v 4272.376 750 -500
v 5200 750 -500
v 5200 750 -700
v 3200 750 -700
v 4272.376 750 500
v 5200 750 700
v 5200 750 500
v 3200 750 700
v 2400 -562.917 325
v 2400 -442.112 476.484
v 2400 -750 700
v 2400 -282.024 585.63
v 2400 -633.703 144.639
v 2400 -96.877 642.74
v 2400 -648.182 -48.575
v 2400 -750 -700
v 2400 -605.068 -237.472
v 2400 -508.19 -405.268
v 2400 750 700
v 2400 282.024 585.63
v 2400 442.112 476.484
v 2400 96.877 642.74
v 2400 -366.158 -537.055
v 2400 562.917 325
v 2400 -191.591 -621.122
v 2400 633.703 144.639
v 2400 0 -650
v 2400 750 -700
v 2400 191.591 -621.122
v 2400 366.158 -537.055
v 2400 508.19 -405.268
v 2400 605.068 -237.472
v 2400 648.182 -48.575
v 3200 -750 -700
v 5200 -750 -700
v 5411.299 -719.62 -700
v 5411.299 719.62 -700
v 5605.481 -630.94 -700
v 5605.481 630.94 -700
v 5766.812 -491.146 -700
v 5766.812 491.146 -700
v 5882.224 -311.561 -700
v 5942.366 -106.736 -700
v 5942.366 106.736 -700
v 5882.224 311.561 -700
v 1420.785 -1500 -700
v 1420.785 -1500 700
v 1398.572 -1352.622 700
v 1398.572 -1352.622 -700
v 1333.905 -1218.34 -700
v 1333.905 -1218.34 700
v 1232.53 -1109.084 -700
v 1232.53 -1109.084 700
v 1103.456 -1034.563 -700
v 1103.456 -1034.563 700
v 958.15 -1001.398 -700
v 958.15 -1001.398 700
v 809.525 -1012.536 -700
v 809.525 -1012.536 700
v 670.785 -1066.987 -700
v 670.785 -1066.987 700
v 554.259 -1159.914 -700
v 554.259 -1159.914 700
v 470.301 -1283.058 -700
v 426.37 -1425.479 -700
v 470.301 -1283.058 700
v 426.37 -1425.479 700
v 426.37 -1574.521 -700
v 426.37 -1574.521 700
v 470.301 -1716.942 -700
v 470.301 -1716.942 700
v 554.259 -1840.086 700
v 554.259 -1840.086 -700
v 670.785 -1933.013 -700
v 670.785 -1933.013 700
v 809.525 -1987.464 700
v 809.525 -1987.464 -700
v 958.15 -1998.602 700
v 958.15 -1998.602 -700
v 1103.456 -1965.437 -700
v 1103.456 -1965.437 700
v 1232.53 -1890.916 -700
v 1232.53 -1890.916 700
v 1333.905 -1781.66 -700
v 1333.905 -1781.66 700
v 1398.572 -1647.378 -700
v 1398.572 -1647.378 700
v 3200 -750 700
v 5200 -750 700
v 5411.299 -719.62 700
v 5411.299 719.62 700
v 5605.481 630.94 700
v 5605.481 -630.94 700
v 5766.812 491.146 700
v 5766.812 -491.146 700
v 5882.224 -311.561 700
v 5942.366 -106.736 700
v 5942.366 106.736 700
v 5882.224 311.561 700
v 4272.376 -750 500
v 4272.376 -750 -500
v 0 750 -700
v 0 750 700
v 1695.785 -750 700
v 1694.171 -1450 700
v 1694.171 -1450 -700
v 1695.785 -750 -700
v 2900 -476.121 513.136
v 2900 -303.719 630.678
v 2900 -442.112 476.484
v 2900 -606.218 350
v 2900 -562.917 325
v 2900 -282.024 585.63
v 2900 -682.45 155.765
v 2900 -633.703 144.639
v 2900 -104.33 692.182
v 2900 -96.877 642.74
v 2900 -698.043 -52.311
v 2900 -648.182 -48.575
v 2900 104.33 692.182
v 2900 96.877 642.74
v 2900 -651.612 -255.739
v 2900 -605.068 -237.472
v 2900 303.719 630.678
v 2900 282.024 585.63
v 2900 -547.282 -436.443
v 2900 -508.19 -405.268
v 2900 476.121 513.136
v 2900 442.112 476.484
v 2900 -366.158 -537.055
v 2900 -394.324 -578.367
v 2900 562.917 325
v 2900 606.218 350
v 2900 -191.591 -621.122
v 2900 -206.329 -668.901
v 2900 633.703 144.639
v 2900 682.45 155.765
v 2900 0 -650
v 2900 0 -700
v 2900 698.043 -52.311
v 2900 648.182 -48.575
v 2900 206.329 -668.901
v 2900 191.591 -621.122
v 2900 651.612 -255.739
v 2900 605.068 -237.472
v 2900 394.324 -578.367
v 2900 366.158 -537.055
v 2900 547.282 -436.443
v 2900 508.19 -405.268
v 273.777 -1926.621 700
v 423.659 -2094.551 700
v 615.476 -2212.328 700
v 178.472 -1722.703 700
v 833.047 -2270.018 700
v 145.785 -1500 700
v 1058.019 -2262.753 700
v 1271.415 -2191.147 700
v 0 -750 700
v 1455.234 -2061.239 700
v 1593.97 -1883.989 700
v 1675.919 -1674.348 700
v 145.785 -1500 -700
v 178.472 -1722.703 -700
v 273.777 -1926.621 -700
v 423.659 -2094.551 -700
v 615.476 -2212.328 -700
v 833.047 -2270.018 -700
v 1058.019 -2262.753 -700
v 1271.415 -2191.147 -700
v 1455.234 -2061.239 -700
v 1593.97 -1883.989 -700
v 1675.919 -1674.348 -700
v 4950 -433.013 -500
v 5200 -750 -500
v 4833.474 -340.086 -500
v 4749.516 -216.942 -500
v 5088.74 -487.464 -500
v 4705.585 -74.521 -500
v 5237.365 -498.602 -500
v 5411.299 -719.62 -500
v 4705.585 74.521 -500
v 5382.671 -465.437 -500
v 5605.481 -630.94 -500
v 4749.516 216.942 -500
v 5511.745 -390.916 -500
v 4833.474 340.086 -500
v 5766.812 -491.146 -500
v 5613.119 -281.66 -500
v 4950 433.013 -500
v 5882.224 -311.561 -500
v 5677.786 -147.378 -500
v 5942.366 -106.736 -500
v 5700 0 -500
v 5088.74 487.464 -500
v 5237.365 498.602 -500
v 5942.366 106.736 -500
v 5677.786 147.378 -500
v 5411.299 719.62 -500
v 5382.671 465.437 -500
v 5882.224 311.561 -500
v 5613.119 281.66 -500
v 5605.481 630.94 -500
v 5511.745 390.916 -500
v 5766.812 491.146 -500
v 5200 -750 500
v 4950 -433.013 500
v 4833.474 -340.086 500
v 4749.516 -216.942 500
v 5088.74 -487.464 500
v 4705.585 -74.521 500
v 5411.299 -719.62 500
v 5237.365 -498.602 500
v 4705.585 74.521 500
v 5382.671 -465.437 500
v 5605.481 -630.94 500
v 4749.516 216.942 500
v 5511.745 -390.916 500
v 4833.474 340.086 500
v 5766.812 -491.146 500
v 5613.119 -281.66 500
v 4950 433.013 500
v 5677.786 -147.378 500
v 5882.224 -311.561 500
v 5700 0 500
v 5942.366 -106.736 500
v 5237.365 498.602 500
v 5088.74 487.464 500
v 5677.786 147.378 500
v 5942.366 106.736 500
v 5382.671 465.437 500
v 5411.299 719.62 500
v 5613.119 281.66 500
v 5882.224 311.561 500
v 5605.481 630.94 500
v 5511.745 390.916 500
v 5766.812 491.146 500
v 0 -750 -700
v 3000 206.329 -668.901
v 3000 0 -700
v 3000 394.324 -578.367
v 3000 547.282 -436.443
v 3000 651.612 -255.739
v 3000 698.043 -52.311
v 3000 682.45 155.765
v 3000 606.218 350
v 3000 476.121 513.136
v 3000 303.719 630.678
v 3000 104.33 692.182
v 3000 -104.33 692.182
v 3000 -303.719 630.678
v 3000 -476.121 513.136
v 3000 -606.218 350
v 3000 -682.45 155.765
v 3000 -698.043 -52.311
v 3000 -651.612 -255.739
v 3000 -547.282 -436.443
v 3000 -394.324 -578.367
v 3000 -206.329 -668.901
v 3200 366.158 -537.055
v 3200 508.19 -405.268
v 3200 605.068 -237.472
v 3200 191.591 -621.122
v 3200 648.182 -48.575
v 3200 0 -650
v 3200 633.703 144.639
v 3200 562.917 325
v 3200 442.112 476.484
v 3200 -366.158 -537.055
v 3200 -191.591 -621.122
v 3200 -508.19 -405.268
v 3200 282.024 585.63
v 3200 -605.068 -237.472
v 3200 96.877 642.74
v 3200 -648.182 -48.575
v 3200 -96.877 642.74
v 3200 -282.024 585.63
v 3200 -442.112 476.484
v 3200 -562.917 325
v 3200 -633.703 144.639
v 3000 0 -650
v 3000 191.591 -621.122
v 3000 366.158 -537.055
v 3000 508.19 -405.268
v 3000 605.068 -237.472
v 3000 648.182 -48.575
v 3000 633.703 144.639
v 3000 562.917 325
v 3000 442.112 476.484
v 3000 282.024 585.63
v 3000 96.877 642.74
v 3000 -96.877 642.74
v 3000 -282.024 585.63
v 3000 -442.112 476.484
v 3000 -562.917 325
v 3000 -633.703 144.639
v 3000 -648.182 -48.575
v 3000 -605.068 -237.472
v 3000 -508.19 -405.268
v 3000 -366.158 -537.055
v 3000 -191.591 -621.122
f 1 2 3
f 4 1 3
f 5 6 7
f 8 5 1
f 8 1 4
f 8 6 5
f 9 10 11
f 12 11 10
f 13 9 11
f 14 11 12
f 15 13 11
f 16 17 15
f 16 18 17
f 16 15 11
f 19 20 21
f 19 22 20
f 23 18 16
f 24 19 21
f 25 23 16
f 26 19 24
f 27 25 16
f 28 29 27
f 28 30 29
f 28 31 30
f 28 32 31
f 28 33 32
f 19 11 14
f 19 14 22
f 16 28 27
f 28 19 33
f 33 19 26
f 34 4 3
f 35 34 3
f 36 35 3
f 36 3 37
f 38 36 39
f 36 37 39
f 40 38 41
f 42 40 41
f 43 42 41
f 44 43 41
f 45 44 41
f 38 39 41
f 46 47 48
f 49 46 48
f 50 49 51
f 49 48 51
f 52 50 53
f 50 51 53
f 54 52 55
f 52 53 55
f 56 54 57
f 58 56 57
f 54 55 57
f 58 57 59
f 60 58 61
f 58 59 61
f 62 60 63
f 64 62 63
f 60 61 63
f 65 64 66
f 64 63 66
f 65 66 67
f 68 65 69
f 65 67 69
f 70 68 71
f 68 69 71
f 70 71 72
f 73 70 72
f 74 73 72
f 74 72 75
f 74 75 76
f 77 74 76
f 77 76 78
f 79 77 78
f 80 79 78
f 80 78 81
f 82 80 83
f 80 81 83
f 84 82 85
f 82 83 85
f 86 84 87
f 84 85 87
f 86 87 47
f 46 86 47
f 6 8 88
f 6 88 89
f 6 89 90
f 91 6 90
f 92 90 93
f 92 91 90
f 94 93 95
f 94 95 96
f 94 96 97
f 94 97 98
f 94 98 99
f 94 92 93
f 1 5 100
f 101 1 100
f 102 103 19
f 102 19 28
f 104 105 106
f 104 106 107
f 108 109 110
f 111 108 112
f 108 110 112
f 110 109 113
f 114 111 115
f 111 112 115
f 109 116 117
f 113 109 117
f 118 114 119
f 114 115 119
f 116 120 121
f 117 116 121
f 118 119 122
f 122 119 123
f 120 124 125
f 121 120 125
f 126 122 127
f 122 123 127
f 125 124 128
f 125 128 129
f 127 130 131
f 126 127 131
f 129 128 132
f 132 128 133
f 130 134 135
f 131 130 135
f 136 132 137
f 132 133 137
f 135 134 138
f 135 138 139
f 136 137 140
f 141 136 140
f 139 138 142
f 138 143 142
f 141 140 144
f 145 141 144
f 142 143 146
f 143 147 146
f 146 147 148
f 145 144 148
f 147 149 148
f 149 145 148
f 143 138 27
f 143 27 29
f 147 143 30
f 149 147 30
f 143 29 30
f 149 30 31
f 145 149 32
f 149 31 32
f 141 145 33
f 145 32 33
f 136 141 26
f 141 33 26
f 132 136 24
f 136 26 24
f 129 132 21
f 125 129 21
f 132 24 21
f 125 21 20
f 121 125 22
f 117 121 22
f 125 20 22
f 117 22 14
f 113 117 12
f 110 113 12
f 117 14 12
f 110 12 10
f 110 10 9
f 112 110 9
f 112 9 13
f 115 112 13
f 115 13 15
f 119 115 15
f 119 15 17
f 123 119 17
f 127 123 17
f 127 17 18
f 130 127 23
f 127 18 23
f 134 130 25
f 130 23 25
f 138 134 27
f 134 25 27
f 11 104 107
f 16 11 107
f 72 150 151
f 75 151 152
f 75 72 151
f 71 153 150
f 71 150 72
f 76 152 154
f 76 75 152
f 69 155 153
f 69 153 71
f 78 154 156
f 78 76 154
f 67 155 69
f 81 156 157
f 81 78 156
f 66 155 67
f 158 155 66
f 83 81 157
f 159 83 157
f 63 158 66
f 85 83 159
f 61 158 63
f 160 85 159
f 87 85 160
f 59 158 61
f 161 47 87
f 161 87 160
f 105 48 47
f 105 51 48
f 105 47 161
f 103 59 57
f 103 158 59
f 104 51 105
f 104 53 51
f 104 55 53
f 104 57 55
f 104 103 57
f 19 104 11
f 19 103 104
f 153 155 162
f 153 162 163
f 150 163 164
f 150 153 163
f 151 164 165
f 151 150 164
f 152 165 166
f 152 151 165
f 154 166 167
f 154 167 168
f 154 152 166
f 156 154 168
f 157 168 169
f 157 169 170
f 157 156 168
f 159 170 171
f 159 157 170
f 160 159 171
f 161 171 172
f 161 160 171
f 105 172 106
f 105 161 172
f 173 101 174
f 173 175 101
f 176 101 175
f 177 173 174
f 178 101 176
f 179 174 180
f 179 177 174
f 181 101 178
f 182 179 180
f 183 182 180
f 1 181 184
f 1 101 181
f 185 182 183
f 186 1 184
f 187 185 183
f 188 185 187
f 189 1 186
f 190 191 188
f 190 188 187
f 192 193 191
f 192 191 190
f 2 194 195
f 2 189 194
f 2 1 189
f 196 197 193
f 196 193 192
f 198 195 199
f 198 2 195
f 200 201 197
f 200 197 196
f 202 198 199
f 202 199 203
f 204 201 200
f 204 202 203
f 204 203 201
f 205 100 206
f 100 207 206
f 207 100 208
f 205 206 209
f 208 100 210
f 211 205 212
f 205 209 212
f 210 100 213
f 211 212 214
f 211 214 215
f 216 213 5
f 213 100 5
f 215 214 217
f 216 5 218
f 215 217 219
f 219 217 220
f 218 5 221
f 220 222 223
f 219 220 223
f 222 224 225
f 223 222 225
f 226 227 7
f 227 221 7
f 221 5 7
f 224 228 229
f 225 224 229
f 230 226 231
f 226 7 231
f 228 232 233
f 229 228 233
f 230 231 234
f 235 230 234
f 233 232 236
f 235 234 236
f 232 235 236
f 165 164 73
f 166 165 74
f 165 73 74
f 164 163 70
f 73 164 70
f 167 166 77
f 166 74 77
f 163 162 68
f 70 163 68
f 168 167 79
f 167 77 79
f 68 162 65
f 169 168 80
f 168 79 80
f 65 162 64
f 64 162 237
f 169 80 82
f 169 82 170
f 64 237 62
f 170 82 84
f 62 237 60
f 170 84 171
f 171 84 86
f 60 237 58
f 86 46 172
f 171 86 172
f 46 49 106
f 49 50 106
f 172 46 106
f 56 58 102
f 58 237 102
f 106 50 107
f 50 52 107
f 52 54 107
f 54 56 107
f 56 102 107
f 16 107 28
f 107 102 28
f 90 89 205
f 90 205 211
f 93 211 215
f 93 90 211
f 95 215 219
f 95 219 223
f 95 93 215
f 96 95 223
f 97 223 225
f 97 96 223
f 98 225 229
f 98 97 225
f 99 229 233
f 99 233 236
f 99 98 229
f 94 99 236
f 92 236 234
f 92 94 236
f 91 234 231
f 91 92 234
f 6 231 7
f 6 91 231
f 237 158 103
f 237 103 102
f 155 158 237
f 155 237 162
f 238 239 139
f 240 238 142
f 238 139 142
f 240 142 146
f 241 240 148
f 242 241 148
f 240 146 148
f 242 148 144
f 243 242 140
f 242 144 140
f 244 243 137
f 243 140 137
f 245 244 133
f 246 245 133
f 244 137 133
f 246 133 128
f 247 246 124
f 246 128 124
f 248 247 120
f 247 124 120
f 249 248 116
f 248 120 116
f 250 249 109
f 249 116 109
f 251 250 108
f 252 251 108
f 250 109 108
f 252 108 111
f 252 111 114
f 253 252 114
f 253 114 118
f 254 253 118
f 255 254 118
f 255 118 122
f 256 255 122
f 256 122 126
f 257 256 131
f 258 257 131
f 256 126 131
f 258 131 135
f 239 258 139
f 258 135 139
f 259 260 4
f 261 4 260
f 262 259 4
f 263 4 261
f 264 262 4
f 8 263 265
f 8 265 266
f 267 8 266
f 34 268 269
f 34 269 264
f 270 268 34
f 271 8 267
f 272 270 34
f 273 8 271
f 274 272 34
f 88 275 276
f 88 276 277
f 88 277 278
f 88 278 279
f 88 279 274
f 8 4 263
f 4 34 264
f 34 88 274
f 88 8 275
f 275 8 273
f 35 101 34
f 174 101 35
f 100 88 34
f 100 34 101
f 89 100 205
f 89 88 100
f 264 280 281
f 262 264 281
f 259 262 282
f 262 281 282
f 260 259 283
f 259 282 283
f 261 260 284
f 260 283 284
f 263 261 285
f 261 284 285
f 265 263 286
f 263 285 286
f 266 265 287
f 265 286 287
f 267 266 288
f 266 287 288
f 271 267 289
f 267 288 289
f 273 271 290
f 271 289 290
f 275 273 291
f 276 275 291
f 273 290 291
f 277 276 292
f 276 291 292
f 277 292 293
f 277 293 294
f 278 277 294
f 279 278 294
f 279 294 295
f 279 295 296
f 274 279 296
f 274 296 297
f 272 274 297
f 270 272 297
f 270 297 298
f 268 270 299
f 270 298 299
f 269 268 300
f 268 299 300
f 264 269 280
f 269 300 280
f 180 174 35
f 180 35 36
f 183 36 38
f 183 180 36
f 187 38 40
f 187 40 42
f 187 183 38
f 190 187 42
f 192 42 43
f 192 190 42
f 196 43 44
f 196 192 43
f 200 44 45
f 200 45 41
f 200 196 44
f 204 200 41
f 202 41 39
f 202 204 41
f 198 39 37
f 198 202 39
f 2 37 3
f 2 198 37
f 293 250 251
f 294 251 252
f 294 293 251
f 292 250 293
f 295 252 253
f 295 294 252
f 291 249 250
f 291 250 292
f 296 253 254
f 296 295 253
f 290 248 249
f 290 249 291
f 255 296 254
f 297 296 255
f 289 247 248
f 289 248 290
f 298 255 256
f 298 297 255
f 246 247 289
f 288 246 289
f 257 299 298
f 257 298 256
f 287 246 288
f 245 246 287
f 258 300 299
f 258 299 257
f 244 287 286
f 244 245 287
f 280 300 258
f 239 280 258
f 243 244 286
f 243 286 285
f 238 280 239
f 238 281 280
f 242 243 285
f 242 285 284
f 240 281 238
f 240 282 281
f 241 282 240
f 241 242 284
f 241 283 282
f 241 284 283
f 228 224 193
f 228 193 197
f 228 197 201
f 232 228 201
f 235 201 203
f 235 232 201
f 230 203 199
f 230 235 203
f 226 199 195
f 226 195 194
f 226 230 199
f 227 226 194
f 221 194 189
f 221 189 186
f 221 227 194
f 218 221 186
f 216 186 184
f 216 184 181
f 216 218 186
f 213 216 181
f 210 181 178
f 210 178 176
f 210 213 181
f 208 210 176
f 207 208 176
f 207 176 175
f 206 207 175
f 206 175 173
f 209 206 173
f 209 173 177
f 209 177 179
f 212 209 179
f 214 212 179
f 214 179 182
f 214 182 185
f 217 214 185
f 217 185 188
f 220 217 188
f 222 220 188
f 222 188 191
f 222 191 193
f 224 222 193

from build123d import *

# Parameters (mm, degrees)
SKETCH1_W           = 1400
SKETCH1_H           = 1500
BOSS_EXTRUDE1_DEPTH = 2400
SKETCH2_R           = 650
BOSS_EXTRUDE2_DEPTH = 500
SKETCH3_R           = 700
BOSS_EXTRUDE3_DEPTH = 100
SKETCH4_R           = 500
BOSS_EXTRUDE4_DEPTH = 1400
SKETCH5_R           = 650
BOSS_EXTRUDE5_DEPTH = 200
BOSS_EXTRUDE7_DEPTH = 700
CUT_EXTRUDE1_DEPTH  = 500
BOSS_EXTRUDE8_REACH = 6524.126
SKETCH8_R           = 500


with BuildPart() as part:
    # Sketch1 → Boss-Extrude1 (new body)
    with BuildSketch(Plane(origin=(0, 0, 0), x_dir=(0, 0, -1), z_dir=(1, 0, 0))):
        Rectangle(SKETCH1_W, SKETCH1_H)
    extrude(amount=BOSS_EXTRUDE1_DEPTH)

    # Sketch2 → Boss-Extrude2 (add)
    with BuildSketch(Plane(origin=(2400, 0, 0), x_dir=(0, 0, -1), z_dir=(1, 0, 0))):
        Circle(SKETCH2_R)
    extrude(amount=BOSS_EXTRUDE2_DEPTH)

    # Sketch3 → Boss-Extrude3 (add)
    with BuildSketch(Plane(origin=(2900, 0, 0), x_dir=(0, 0, -1), z_dir=(1, 0, 0))):
        Circle(SKETCH3_R)
    extrude(amount=BOSS_EXTRUDE3_DEPTH)

    # Sketch4 → Boss-Extrude4 (add)
    with BuildSketch(Plane.XY.offset(700)):
        with BuildLine():
            Line((1695.785231853, -750), (0, -750))
            Line((0, -750), (145.785231853, -1500))
            ThreePointArc((145.785231853, -1500), (945.798262882, -2274.596248557), (1694.170646766, -1450))
            Line((1694.170646766, -1450), (1695.785231853, -750))
        make_face()
        with Locations((920.785231853, -1500)):
            Circle(SKETCH4_R, mode=Mode.SUBTRACT)
    extrude(amount=-BOSS_EXTRUDE4_DEPTH)

    # Sketch5 → Boss-Extrude5 (add)
    with BuildSketch(Plane(origin=(3000, 0, 0), x_dir=(0, 0, -1), z_dir=(1, 0, 0))):
        Circle(SKETCH5_R)
    extrude(amount=BOSS_EXTRUDE5_DEPTH)

    # Sketch6 → Boss-Extrude7 (add, symmetric)
    with BuildSketch(Plane.XY):
        with BuildLine():
            Line((5200, 750), (3200, 750))
            Line((3200, 750), (3200, -750))
            Line((3200, -750), (5200, -750))
            ThreePointArc((5200, -750), (5950, 0), (5200, 750))
        make_face()
    extrude(amount=BOSS_EXTRUDE7_DEPTH, both=True)

    # Sketch7 → Cut-Extrude1 (cut, symmetric)
    with BuildSketch(Plane.XY):
        with BuildLine():
            Line((5200, 750), (4272.376484701, 750))
            Line((4272.376484701, 750), (4272.376484701, -750))
            Line((4272.376484701, -750), (5200, -750))
            ThreePointArc((5200, -750), (5950, 0), (5200, 750))
        make_face()
    extrude(amount=CUT_EXTRUDE1_DEPTH, both=True, mode=Mode.SUBTRACT)

    # Sketch8 → Boss-Extrude8 (add, up to next)
    with BuildSketch(Plane.XY.offset(700), mode=Mode.PRIVATE) as boss_extrude8_sk1:
        with Locations((5200, 0)):
            Circle(SKETCH8_R)
    boss_extrude8_tool1 = extrude(boss_extrude8_sk1.sketch, amount=-BOSS_EXTRUDE8_REACH, mode=Mode.PRIVATE) - part.part
    add(boss_extrude8_tool1.solids().sort_by_distance((5200, 0, 700))[0])


solid = part.part
